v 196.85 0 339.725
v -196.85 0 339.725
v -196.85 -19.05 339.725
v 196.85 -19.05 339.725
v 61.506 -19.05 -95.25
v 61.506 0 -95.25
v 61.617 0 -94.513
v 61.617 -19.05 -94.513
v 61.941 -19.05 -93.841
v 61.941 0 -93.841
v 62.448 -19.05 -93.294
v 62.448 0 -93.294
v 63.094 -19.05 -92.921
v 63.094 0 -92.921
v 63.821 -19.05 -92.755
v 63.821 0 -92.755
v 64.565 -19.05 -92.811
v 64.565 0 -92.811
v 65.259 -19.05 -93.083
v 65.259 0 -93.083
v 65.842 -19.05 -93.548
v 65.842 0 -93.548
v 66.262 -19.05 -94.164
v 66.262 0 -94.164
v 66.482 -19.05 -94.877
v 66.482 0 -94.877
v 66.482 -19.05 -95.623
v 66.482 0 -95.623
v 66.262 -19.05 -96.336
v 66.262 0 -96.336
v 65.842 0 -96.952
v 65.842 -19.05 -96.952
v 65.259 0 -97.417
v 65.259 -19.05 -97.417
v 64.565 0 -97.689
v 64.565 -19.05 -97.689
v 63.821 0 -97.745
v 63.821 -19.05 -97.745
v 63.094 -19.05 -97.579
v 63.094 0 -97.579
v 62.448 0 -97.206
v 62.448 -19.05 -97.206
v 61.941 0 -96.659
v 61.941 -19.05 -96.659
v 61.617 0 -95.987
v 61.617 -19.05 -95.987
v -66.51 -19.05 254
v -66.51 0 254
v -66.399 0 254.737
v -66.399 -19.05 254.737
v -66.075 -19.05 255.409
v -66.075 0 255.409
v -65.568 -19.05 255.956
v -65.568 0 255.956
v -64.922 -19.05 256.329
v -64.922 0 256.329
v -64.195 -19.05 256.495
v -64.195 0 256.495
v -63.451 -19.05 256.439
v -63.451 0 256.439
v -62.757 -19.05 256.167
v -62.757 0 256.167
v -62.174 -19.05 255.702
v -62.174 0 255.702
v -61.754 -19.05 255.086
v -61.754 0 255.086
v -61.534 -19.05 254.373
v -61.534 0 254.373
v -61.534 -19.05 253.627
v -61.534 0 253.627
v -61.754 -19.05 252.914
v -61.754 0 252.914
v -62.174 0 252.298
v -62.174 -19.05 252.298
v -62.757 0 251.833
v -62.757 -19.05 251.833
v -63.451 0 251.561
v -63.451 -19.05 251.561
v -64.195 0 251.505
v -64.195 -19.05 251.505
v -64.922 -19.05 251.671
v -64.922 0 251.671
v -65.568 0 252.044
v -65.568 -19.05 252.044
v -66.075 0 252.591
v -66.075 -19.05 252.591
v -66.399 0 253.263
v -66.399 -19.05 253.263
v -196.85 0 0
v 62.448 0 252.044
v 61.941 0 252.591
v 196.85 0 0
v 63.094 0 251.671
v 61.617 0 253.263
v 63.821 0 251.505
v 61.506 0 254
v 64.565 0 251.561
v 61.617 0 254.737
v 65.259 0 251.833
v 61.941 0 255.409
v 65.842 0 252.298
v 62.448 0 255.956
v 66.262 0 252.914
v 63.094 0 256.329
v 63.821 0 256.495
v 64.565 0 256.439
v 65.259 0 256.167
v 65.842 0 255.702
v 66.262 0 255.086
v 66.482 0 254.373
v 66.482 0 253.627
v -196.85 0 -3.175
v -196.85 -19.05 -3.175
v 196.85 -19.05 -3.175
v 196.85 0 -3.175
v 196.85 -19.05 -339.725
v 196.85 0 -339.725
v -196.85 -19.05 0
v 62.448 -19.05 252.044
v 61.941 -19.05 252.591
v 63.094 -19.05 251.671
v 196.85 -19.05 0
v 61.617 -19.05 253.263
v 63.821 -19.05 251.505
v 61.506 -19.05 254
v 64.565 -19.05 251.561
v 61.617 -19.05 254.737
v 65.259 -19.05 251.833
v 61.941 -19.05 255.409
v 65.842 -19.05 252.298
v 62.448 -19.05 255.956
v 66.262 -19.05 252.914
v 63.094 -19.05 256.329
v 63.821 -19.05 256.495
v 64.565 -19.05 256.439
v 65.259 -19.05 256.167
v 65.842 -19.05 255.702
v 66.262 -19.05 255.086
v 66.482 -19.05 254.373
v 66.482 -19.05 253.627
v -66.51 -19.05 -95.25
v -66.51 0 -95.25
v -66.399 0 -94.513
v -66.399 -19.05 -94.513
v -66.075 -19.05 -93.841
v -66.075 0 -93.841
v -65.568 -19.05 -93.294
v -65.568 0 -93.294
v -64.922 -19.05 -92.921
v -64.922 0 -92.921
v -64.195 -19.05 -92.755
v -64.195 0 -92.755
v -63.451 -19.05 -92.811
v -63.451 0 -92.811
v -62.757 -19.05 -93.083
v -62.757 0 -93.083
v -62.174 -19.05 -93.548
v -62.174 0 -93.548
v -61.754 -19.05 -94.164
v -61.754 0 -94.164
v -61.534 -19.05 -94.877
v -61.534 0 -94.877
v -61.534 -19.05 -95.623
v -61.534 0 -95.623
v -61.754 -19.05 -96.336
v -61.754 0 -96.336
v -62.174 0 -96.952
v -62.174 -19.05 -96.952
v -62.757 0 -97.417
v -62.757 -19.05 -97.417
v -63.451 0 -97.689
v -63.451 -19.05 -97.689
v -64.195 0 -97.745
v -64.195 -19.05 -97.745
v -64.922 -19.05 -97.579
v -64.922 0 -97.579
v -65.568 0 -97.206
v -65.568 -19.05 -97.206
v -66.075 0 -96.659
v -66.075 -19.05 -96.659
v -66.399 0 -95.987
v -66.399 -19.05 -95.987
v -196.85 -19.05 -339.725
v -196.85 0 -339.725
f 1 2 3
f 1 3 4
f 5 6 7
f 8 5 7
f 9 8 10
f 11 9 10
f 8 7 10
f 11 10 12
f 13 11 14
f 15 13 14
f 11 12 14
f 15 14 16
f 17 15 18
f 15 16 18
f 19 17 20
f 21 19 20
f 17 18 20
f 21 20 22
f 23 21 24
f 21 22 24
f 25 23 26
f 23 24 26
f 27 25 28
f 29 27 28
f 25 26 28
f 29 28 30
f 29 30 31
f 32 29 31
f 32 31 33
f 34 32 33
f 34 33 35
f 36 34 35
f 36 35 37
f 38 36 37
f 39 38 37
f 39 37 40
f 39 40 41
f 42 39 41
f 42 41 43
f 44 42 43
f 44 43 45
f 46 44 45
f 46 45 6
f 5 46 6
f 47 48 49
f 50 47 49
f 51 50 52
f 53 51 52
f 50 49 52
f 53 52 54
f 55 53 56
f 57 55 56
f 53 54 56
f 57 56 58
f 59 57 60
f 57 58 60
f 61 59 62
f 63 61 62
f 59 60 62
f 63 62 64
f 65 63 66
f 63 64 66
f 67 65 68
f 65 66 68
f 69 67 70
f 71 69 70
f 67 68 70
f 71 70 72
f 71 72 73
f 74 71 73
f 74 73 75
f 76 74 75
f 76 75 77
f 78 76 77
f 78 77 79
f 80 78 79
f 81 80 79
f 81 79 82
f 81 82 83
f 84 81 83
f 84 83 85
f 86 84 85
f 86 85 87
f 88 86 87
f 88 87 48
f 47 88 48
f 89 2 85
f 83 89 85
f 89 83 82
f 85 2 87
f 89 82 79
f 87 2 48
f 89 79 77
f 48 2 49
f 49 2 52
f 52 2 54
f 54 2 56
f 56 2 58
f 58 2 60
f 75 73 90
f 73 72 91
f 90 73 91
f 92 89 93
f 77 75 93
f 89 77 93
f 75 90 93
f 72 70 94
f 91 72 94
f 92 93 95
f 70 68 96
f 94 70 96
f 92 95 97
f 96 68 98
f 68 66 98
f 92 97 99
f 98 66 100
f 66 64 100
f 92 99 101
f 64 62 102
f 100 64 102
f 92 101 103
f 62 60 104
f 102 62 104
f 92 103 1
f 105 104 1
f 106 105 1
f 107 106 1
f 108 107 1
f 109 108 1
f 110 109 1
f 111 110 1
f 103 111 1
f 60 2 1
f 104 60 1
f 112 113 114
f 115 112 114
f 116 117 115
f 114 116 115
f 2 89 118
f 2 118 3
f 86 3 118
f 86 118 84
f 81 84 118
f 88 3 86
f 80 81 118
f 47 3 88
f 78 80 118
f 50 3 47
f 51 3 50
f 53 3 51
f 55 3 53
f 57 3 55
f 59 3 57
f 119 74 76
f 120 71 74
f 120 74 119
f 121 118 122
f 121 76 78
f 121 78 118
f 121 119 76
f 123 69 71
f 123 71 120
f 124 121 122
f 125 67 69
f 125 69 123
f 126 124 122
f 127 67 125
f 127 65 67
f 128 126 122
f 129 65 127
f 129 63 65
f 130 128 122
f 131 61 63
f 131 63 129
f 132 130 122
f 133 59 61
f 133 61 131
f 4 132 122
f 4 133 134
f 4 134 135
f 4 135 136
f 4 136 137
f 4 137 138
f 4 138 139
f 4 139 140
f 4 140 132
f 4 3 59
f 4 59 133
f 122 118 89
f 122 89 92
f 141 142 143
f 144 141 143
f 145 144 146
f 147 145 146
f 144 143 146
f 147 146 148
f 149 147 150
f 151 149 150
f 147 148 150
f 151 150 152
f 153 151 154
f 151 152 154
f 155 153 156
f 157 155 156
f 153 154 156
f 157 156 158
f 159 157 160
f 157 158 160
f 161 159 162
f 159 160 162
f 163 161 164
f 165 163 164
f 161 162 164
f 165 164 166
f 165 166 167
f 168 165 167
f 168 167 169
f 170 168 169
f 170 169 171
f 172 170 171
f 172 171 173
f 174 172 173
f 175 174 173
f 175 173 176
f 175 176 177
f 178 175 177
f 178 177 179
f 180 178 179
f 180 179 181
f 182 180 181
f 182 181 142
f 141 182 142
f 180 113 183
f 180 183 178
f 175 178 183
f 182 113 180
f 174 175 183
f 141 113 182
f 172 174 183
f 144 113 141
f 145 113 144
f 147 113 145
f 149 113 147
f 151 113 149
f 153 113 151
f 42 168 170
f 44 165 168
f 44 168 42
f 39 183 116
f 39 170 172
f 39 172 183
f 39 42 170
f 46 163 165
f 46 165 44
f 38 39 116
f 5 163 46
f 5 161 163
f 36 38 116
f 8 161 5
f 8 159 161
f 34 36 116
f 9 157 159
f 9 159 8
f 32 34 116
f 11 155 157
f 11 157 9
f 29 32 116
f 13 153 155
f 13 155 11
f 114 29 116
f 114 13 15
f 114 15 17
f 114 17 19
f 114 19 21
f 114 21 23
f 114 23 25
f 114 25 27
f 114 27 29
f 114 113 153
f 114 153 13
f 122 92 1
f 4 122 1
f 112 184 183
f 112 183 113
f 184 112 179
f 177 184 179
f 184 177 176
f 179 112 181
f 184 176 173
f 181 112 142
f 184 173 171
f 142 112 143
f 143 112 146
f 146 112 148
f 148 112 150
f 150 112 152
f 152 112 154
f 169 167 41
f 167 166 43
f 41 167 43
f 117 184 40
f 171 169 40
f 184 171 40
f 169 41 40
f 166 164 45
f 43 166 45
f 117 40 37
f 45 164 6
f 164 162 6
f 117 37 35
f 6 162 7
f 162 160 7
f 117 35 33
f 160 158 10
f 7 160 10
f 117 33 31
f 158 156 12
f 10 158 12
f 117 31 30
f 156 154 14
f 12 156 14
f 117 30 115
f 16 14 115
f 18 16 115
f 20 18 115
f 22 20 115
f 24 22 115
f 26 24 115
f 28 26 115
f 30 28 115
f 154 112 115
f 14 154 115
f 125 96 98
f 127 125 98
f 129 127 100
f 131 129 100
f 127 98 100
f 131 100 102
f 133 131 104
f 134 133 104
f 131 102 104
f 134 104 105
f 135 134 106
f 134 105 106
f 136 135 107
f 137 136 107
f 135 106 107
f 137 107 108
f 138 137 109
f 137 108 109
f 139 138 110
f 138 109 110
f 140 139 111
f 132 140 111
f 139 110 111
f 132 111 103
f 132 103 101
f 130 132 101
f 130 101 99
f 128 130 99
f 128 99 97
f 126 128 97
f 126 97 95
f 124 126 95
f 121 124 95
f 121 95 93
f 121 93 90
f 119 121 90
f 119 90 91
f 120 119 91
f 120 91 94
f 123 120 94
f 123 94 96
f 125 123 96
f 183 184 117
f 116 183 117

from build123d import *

# Parameters (mm, degrees)
F0_W     = 393.7
F0_H     = 679.45
F1_DEPTH = 19.05
F2_W     = 393.7
F2_H     = 3.175
F3_DEPTH = 25.4
F5_D     = 5.0038
F7_D     = 5.0038


# Not quite as in the source:
# - a feature names something its author has since deleted; it is built from what else it names


with BuildPart() as f1:
    # F0 (on Front) → F1 (new body)
    with BuildSketch(Plane.XZ):
        Rectangle(F0_W, F0_H)
    extrude(amount=F1_DEPTH)

    # F2 (on face) → F3 (cut)
    with BuildSketch(Plane.XZ.offset(19.05)):
        with Locations((0, -1.5875)):
            Rectangle(F2_W, F2_H)
    extrude(amount=-F3_DEPTH, mode=Mode.SUBTRACT)

    # F5 (through all)
    with Locations(Plane.XZ.offset(19.05)):
        with Locations((-64.008, 254), (64.008, 254)):
            Hole(F5_D / 2)

    # F7 (through all)
    with Locations(Plane.XZ.offset(19.05)):
        with Locations((64.008, -95.25), (-64.008, -95.25)):
            Hole(F7_D / 2)


solid = f1.part
